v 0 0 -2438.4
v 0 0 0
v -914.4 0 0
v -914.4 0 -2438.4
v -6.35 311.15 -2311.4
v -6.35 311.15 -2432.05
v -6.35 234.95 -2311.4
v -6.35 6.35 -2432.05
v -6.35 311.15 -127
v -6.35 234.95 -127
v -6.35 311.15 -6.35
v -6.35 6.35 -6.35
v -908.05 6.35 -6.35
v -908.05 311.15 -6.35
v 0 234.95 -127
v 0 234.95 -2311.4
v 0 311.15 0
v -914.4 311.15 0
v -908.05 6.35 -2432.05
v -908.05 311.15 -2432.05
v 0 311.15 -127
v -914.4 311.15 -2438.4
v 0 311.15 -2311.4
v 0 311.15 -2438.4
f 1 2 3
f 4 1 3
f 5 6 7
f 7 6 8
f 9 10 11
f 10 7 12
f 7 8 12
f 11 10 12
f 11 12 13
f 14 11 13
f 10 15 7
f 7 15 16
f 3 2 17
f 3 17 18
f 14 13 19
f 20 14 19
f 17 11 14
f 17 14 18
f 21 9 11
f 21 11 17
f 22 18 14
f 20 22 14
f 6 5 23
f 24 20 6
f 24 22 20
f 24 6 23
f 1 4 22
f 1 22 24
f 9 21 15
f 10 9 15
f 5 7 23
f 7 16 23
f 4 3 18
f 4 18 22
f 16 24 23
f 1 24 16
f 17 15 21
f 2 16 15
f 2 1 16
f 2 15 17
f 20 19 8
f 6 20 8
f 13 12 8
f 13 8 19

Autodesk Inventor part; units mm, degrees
ref_plane "YZ Plane" through (0, 0, 0) normal (1, 0, 0) x (0, 1, 0)
ref_plane "XZ Plane" through (0, 0, 0) normal (0, 1, 0) x (-1, 0, 0)
ref_plane "XY Plane" through (0, 0, 0) normal (0, 0, 1) x (1, 0, 0)
sketch "Sketch2" plane through (0, 0, 0) normal (0, 1, 0) x (-1, 0, 0)
  line L0 (0, 0) -> (914.4, 0)
  line L1 (914.4, 0) -> (914.4, -2438.4)
  line L2 (914.4, -2438.4) -> (0, -2438.4)
  line L3 (0, -2438.4) -> (0, 0)
  dimension "d22" = 2438.4
  dimension "d23" = 914.4
extrude "Extrusion2" add sketch "Sketch2" along normal blind 6.35
sketch "Sketch3" plane through (0, 6.35, 0) normal (0, 1, 0) x (1, 0, 0)
  line L0 (-914.4, 2438.4) -> (-914.4, 0) projected
  line L1 (0, 2438.4) -> (-914.4, 2438.4) projected
  line L2 (-914.4, 0) -> (0, 0)
  line L3 (0, 0) -> (0, 2438.4)
  line L4 (0, 2438.4) -> (-914.4, 2438.4)
  line L5 (-914.4, 2438.4) -> (-914.4, 0)
  line L6 (-6.35, 6.35) -> (-908.05, 6.35)
  line L7 (-908.05, 6.35) -> (-908.05, 2432.05)
  line L8 (-908.05, 2432.05) -> (-6.35, 2432.05)
  line L9 (-6.35, 2432.05) -> (-6.35, 6.35)
  dimension "d24" = 6.35
extrude "Extrusion3" add sketch "Sketch3" along normal blind 304.8
sketch "Sketch4" plane through (0, 0, 0) normal (1, 0, 0) x (0, 0, -1)
  line L0 (0, 0) -> (0, 311.15) projected
  line L1 (2438.4, 0) -> (2438.4, 311.15) projected
  line L2 (0, 311.15) -> (2438.4, 311.15)
  line L3 (2438.4, 311.15) -> (2311.4, 311.15)
  line L4 (2432.05, 311.15) -> (6.35, 311.15) projected
  line L5 (0, 311.15) -> (127, 311.15)
  line L6 (127, 311.15) -> (127, 234.95)
  line L7 (127, 234.95) -> (2311.4, 234.95)
  line L8 (2311.4, 234.95) -> (2311.4, 311.15)
  dimension "d27" = 127
  dimension "d28" = 127
  dimension "d29" = 76.2
extrude "Extrusion4" cut sketch "Sketch4" against normal blind 50.8
properties part number "ElectricalBoard.ver2-1111-2020"
